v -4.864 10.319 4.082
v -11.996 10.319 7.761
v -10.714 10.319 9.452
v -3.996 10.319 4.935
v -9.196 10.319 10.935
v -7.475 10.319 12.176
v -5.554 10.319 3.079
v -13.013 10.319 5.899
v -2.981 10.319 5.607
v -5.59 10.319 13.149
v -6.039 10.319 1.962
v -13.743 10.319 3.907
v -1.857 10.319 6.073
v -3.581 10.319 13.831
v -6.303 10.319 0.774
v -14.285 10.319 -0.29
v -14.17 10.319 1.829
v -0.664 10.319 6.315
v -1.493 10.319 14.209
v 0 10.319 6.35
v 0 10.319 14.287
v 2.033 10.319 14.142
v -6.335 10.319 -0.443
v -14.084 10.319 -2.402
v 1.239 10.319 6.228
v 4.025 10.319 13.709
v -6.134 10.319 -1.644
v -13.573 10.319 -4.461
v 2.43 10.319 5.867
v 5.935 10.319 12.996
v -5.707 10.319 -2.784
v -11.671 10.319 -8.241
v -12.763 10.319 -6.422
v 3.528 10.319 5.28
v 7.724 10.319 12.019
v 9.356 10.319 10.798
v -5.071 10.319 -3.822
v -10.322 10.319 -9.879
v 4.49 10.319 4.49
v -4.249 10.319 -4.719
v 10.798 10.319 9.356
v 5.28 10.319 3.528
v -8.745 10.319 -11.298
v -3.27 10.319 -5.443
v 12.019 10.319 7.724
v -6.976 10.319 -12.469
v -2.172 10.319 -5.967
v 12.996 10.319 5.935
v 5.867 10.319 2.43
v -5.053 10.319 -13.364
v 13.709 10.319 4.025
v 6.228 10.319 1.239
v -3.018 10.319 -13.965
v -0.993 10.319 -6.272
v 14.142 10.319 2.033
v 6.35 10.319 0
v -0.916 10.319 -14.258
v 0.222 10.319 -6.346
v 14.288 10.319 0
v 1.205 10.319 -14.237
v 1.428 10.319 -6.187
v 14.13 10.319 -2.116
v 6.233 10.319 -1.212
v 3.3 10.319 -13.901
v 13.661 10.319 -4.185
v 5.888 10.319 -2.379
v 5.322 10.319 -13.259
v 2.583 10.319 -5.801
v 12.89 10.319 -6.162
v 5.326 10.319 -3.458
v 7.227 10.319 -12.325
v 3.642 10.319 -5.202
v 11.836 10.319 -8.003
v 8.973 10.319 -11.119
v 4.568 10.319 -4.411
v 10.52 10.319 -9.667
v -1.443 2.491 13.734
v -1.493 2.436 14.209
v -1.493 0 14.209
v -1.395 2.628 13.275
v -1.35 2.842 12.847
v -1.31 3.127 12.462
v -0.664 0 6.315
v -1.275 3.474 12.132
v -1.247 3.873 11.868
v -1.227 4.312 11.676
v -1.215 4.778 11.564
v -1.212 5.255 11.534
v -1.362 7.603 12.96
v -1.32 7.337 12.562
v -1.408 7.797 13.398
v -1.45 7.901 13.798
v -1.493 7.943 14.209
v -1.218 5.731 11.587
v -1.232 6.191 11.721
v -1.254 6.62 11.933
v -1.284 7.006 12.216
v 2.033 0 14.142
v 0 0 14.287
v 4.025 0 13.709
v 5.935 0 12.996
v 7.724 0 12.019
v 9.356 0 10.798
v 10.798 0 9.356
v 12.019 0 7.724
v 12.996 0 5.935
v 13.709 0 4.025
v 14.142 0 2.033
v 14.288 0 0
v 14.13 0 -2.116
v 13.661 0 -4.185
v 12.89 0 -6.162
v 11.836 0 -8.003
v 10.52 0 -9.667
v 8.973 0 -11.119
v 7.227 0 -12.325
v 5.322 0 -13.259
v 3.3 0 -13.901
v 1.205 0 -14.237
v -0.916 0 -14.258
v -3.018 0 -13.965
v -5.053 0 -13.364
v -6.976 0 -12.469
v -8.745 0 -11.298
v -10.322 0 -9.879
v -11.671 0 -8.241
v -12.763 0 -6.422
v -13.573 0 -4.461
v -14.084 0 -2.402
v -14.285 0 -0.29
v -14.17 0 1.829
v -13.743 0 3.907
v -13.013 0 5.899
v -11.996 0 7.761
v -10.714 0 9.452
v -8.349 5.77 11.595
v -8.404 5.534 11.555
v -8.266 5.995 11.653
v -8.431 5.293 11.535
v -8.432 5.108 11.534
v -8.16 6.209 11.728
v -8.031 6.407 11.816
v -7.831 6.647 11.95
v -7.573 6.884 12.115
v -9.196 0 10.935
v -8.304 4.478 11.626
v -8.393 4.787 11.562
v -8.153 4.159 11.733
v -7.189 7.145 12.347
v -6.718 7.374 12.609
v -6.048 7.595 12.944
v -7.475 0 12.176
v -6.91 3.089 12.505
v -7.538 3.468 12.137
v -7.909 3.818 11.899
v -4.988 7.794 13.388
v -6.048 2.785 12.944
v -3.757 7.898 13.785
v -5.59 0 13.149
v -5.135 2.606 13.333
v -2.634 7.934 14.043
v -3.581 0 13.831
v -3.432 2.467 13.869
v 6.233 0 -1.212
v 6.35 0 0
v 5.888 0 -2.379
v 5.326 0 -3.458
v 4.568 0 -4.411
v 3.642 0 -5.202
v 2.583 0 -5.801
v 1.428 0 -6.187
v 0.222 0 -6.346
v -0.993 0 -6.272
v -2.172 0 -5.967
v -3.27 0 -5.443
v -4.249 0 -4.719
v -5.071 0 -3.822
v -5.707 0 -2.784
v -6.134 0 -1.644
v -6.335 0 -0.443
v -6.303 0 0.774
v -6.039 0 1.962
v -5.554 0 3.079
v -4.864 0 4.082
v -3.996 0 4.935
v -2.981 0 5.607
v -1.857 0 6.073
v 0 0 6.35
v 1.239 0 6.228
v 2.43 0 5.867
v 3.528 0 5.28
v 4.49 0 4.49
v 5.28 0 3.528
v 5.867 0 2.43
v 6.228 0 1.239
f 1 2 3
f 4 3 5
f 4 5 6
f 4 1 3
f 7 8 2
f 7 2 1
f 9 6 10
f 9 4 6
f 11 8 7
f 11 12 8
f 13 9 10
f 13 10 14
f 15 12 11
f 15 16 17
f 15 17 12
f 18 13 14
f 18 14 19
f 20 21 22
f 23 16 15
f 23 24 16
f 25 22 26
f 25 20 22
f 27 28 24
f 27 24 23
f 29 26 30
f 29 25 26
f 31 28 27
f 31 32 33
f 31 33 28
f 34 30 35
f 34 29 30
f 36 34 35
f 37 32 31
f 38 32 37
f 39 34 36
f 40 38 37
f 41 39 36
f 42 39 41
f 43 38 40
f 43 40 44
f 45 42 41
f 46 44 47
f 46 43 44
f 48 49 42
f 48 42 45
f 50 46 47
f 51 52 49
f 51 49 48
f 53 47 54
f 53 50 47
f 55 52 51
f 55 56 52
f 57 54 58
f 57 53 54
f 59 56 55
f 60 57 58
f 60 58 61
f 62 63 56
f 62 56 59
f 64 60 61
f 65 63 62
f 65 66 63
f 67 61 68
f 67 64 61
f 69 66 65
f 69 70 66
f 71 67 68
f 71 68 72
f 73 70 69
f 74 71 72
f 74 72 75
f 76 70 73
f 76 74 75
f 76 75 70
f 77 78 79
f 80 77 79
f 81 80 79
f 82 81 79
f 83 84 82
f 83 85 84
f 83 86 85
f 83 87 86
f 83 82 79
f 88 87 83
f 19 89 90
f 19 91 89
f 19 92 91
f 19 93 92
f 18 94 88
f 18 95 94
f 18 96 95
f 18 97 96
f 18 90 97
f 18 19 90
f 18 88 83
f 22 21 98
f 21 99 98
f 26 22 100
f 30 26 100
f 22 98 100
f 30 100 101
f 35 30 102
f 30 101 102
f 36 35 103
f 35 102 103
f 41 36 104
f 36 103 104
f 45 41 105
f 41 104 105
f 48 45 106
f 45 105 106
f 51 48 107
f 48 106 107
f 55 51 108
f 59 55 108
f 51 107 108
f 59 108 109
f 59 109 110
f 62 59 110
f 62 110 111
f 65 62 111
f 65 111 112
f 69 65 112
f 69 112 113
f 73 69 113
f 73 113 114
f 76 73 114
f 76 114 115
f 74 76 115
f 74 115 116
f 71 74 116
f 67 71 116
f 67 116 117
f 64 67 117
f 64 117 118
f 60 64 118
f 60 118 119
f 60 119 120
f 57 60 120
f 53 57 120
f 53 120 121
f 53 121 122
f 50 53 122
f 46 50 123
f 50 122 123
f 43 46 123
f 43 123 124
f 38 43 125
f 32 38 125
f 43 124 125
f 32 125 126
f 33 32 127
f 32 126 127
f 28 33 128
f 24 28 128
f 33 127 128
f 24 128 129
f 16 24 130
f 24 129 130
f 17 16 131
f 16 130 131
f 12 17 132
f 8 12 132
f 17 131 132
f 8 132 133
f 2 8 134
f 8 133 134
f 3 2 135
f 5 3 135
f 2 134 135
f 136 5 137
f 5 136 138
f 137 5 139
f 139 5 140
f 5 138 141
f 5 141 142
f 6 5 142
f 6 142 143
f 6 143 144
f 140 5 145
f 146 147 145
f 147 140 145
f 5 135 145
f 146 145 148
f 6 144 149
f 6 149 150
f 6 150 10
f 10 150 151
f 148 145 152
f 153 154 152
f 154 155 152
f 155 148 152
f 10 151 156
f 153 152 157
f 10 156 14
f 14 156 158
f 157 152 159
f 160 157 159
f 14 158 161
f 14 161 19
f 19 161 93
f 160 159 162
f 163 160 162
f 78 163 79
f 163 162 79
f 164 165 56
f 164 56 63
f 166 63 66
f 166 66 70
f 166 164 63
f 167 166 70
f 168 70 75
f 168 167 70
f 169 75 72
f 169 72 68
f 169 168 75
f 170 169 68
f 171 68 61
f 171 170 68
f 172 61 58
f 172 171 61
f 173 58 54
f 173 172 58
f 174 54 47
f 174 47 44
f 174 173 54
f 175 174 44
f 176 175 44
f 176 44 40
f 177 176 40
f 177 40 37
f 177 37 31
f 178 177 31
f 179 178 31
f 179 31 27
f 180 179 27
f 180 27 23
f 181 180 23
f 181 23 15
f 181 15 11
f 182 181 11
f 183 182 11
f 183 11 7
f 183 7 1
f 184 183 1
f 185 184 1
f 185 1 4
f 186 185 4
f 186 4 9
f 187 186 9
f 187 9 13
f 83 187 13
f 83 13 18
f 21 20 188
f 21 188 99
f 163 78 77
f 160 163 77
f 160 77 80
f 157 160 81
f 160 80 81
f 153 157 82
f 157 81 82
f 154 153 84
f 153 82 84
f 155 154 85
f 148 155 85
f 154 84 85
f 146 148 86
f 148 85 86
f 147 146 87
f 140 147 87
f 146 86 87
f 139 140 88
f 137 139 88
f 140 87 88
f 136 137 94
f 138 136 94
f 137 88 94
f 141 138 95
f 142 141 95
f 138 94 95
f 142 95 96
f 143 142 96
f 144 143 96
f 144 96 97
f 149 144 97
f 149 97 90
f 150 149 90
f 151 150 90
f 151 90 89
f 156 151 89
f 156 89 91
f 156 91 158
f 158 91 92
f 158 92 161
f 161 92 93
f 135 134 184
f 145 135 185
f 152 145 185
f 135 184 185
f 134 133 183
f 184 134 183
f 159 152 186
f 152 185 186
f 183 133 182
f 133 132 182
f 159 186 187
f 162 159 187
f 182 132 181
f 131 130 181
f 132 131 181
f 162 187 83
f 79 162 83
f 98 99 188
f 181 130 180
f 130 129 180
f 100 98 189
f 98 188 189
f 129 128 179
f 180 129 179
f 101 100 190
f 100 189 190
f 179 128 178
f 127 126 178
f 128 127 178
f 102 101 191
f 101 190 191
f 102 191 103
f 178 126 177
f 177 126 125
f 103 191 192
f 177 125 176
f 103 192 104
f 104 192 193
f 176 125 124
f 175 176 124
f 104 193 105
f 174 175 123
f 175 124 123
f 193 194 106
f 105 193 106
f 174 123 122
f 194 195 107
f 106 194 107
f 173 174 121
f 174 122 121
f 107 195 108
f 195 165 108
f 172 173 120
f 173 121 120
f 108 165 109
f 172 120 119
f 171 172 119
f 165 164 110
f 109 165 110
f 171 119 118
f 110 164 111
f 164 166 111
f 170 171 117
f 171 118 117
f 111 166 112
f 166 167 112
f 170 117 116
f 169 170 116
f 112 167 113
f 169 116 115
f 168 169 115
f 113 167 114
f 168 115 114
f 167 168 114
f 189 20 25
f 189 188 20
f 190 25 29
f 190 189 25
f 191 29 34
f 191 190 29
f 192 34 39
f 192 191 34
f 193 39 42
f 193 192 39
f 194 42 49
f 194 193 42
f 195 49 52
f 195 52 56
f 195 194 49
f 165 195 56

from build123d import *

# Parameters (mm, degrees)
SKETCH1_R           = 14.2875
SKETCH1_R_2         = 6.35
BOSS_EXTRUDE1_DEPTH = 10.31875
CUT_EXTRUDE1_DEPTH  = 10.31875
CUT_EXTRUDE2_DEPTH  = 10.31875


with BuildPart() as part:
    # Sketch1 → Boss-Extrude1 (new body)
    with BuildSketch(Plane(origin=(0, 0, 0), x_dir=(1, 0, 0), z_dir=(0, 1, 0))):
        Circle(SKETCH1_R)
        Circle(SKETCH1_R_2, mode=Mode.SUBTRACT)
    extrude(amount=BOSS_EXTRUDE1_DEPTH)

    # Sketch2 → Cut-Extrude1 (cut)
    with BuildSketch(Plane(origin=(0, 0, 0), x_dir=(0, 0, -1), z_dir=(1, 0, 0))):
        with BuildLine():
            Line((-14.2875, 7.944437688), (-16.071181414, 7.944437688))
            Line((-16.071181414, 7.944437688), (-16.071181414, 2.435187999))
            Line((-16.071181414, 2.435187999), (-14.2875, 2.435187999))
            ThreePointArc((-14.2875, 2.435187999), (-11.532875155, 5.189812844), (-14.2875, 7.944437688))
        make_face()
    extrude(amount=-CUT_EXTRUDE1_DEPTH, mode=Mode.SUBTRACT)

    # Sketch3 → Cut-Extrude2 (cut)
    with BuildSketch(Plane(origin=(0, 10.31875, 0), x_dir=(1, 0, 0), z_dir=(0, 1, 0))):
        with BuildLine():
            Line((0, -6.35), (0, -14.2875))
            ThreePointArc((0, -14.2875), (-0.747749975, -14.267919478), (-1.493450419, -14.20923158))
            Line((-1.493450419, -14.20923158), (-0.663755742, -6.315214036))
            ThreePointArc((-0.663755742, -6.315214036), (-0.332333322, -6.341297546), (0, -6.35))
        make_face()
    extrude(amount=-CUT_EXTRUDE2_DEPTH, mode=Mode.SUBTRACT)


solid = part.part
